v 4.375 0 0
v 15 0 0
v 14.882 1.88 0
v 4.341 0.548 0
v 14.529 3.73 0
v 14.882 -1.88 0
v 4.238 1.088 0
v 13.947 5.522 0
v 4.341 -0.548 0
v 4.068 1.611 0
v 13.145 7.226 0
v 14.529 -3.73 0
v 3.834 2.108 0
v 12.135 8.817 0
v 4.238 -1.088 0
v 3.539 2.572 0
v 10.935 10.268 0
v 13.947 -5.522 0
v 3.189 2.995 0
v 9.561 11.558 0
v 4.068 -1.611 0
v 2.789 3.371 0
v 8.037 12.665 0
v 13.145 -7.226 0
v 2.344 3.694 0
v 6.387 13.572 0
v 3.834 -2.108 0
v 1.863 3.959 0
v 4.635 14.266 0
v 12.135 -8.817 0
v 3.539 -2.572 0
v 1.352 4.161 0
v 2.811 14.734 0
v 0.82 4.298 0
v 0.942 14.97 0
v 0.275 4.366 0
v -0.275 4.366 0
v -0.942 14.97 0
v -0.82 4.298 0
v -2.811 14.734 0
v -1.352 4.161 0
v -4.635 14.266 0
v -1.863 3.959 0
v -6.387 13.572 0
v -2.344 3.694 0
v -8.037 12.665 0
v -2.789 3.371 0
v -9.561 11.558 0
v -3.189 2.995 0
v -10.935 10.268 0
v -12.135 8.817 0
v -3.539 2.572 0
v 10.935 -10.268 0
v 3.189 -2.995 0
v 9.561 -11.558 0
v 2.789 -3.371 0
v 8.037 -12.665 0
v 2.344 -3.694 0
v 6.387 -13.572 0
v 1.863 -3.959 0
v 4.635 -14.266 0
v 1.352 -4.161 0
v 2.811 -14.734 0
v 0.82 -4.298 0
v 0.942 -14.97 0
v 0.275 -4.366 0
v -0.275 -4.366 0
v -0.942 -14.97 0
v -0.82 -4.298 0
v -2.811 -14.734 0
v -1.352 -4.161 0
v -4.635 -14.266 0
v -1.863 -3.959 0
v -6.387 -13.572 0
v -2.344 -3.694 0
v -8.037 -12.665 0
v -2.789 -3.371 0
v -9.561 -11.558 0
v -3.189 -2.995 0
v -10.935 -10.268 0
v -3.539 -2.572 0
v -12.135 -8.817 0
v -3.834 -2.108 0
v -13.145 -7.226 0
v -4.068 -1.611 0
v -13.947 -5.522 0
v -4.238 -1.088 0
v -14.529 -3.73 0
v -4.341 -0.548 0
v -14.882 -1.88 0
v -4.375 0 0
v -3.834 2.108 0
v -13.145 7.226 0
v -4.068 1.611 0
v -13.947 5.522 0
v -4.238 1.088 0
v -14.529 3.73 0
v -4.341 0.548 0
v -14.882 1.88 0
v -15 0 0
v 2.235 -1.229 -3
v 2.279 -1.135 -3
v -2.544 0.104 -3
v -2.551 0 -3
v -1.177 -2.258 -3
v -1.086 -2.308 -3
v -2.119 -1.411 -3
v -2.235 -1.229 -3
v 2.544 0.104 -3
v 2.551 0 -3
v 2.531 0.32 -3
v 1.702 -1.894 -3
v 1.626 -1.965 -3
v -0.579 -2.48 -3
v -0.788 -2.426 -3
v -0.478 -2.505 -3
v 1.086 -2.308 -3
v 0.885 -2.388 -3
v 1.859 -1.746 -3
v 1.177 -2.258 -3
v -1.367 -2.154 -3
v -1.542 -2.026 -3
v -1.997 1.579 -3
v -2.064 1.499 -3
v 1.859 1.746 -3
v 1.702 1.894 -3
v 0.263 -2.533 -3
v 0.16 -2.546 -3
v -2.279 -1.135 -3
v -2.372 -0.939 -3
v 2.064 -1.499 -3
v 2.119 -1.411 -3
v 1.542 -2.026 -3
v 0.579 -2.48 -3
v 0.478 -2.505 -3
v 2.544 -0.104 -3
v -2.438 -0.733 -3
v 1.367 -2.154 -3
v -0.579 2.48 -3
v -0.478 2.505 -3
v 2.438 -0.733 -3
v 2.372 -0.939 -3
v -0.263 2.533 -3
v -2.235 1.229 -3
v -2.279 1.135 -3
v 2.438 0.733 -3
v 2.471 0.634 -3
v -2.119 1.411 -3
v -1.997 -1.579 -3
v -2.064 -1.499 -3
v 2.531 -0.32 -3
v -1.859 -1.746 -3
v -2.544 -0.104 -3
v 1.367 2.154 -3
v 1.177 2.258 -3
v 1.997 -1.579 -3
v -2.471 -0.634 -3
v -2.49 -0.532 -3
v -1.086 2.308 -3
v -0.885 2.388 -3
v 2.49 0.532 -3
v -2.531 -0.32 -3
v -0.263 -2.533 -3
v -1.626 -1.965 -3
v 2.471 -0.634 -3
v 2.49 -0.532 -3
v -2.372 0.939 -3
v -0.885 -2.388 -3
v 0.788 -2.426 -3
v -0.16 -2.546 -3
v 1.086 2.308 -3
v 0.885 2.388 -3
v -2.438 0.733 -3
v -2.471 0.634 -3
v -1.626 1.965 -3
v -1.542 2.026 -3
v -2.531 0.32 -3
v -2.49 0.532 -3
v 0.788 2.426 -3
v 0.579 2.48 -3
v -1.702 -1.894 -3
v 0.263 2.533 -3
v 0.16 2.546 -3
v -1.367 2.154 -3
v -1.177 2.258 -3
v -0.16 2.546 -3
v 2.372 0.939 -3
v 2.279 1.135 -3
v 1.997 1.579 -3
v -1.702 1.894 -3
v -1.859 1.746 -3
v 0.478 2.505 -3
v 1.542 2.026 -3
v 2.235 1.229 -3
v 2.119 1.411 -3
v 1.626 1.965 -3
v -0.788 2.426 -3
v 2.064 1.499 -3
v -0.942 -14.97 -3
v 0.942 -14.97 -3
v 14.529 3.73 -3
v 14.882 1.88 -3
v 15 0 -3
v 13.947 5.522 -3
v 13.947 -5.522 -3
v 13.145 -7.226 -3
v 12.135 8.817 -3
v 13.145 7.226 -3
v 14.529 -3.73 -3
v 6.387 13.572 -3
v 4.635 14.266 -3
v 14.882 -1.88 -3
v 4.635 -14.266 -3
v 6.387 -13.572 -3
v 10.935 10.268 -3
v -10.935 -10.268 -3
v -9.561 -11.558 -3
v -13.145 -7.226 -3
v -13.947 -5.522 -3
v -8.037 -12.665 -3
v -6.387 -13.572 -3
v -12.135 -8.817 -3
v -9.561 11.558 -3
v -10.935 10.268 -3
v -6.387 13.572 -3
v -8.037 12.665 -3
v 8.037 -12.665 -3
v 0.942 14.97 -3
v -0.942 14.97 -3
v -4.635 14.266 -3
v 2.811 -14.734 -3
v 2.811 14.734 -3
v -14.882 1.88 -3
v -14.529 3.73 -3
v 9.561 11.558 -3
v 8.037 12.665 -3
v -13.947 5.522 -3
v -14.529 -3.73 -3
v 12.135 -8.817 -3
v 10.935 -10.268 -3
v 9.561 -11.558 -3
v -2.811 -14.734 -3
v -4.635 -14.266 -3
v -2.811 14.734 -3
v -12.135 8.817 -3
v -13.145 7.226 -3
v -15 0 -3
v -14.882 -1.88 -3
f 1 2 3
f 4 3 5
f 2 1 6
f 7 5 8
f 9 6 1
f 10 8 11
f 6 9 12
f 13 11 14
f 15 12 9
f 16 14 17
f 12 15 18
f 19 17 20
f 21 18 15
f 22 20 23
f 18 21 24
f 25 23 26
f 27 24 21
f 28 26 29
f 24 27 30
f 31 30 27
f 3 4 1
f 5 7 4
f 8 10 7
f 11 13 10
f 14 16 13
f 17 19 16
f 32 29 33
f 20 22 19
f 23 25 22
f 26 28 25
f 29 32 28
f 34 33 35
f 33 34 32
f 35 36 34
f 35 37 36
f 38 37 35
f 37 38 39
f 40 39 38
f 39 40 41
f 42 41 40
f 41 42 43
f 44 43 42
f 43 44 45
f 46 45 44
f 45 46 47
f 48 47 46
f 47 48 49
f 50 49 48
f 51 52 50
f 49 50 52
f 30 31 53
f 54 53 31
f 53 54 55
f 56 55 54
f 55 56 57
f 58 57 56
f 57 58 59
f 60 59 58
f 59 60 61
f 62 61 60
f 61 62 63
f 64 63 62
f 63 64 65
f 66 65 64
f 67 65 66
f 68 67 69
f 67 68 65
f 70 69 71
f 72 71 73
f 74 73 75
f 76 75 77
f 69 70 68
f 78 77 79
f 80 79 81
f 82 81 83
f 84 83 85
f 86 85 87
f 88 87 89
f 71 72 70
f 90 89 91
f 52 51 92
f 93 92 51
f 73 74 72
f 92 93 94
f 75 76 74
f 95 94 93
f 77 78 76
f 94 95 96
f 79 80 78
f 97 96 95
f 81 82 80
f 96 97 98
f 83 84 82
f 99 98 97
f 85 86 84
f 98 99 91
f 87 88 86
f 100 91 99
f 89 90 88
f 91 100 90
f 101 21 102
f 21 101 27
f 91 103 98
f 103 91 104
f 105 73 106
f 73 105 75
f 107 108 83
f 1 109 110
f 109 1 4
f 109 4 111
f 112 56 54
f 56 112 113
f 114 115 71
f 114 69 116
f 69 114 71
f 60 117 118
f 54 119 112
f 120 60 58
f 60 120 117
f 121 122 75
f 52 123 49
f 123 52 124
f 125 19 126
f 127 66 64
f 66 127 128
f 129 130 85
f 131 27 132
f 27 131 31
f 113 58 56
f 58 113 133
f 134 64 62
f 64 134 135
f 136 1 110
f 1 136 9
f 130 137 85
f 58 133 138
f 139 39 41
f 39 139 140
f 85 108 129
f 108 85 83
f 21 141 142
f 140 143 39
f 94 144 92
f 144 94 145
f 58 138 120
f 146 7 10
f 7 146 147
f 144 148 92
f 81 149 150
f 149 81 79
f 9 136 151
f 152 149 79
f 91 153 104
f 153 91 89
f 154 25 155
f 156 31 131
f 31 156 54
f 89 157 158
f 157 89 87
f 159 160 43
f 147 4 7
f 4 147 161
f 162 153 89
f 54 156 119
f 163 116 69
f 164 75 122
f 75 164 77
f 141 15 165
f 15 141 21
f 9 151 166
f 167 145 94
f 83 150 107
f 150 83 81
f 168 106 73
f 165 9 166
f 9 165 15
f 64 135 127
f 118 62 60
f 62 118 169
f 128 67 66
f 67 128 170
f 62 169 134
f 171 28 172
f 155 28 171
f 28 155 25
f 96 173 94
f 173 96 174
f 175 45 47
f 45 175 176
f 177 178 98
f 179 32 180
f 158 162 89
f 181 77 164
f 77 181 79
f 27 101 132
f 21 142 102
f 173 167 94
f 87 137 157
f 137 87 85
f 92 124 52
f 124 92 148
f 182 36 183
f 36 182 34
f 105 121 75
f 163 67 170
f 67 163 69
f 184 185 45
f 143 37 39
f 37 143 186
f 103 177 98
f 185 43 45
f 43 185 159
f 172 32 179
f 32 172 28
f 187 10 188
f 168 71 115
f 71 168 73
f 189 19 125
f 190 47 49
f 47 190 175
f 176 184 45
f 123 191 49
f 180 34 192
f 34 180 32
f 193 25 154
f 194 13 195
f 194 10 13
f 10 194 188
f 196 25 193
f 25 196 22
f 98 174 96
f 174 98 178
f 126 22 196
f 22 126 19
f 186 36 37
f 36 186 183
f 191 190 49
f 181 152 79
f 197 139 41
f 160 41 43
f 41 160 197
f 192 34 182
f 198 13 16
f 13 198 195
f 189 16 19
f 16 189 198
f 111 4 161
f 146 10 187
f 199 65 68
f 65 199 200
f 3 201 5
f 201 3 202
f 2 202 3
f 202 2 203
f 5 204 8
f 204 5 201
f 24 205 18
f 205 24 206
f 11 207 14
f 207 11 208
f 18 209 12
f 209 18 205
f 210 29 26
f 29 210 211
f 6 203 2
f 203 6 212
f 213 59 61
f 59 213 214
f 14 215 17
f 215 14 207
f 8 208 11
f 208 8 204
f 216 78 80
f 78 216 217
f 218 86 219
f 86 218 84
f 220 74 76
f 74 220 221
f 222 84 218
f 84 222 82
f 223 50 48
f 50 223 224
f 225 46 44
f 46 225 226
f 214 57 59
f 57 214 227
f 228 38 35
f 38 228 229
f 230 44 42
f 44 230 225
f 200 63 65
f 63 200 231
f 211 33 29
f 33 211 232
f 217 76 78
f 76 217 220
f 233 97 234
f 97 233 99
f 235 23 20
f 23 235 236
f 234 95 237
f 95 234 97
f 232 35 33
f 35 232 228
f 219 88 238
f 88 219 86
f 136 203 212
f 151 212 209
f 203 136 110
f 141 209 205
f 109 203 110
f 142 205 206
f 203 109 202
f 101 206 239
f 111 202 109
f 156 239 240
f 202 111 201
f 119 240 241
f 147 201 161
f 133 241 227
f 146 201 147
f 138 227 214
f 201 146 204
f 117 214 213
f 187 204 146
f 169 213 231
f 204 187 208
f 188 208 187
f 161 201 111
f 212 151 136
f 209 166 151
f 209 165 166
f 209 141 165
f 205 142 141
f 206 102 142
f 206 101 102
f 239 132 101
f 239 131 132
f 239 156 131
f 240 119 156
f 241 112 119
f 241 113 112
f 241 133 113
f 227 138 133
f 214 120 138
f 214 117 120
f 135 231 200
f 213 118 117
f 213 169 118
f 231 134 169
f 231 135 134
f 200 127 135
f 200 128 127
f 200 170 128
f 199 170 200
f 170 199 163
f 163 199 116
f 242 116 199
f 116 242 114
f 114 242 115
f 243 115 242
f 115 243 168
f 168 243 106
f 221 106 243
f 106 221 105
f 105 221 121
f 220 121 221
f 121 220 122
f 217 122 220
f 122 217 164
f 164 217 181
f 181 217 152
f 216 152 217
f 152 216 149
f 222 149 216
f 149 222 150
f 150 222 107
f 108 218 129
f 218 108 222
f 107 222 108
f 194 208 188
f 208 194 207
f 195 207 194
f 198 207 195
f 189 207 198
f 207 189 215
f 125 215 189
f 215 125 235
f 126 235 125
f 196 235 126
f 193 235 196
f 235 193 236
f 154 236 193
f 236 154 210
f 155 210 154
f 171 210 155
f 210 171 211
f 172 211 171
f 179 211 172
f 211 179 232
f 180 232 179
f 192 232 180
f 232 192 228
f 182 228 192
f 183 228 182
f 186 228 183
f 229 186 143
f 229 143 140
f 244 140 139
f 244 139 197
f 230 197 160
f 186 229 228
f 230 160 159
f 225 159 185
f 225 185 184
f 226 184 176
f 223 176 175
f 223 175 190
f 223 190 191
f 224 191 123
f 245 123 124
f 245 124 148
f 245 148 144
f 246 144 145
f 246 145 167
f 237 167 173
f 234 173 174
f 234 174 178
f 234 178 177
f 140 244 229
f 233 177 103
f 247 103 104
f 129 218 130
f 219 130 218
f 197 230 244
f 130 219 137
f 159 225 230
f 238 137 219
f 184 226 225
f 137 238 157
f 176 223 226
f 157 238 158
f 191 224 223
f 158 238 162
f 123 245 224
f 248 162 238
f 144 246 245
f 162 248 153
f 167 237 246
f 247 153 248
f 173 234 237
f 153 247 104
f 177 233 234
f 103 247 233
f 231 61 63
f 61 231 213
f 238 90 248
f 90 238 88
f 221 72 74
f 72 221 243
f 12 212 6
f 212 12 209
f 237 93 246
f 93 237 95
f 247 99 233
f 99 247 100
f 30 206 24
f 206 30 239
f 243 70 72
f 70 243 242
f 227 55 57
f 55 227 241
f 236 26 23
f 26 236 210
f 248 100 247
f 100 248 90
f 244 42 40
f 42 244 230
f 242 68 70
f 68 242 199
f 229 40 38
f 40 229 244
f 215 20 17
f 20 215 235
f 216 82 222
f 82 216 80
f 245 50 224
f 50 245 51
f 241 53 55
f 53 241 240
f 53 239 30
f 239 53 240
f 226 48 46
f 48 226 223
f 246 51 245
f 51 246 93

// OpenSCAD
$fn = 50;


difference() {
	union() {
		translate(v = [0, 0, -3.0000000000]) {
			cylinder(h = 3, r = 15.0000000000);
		}
	}
	union() {
		translate(v = [0, 0, 0]) {
			rotate(a = [0, 0, 0]) {
				difference() {
					union() {
						translate(v = [0, 0, -3.0000000000]) {
							cylinder(h = 3, r = 2.0000000000);
						}
						translate(v = [0, 0, -3.7000000000]) {
							cylinder(h = 3.7000000000, r1 = 2.1250000000, r2 = 4.3750000000);
						}
						translate(v = [0, 0, -3.0000000000]) {
							cylinder(h = 3, r = 2.1250000000);
						}
						translate(v = [0, 0, -3.0000000000]) {
							cylinder(h = 3, r = 2.0000000000);
						}
					}
					union();
				}
			}
		}
	}
}
